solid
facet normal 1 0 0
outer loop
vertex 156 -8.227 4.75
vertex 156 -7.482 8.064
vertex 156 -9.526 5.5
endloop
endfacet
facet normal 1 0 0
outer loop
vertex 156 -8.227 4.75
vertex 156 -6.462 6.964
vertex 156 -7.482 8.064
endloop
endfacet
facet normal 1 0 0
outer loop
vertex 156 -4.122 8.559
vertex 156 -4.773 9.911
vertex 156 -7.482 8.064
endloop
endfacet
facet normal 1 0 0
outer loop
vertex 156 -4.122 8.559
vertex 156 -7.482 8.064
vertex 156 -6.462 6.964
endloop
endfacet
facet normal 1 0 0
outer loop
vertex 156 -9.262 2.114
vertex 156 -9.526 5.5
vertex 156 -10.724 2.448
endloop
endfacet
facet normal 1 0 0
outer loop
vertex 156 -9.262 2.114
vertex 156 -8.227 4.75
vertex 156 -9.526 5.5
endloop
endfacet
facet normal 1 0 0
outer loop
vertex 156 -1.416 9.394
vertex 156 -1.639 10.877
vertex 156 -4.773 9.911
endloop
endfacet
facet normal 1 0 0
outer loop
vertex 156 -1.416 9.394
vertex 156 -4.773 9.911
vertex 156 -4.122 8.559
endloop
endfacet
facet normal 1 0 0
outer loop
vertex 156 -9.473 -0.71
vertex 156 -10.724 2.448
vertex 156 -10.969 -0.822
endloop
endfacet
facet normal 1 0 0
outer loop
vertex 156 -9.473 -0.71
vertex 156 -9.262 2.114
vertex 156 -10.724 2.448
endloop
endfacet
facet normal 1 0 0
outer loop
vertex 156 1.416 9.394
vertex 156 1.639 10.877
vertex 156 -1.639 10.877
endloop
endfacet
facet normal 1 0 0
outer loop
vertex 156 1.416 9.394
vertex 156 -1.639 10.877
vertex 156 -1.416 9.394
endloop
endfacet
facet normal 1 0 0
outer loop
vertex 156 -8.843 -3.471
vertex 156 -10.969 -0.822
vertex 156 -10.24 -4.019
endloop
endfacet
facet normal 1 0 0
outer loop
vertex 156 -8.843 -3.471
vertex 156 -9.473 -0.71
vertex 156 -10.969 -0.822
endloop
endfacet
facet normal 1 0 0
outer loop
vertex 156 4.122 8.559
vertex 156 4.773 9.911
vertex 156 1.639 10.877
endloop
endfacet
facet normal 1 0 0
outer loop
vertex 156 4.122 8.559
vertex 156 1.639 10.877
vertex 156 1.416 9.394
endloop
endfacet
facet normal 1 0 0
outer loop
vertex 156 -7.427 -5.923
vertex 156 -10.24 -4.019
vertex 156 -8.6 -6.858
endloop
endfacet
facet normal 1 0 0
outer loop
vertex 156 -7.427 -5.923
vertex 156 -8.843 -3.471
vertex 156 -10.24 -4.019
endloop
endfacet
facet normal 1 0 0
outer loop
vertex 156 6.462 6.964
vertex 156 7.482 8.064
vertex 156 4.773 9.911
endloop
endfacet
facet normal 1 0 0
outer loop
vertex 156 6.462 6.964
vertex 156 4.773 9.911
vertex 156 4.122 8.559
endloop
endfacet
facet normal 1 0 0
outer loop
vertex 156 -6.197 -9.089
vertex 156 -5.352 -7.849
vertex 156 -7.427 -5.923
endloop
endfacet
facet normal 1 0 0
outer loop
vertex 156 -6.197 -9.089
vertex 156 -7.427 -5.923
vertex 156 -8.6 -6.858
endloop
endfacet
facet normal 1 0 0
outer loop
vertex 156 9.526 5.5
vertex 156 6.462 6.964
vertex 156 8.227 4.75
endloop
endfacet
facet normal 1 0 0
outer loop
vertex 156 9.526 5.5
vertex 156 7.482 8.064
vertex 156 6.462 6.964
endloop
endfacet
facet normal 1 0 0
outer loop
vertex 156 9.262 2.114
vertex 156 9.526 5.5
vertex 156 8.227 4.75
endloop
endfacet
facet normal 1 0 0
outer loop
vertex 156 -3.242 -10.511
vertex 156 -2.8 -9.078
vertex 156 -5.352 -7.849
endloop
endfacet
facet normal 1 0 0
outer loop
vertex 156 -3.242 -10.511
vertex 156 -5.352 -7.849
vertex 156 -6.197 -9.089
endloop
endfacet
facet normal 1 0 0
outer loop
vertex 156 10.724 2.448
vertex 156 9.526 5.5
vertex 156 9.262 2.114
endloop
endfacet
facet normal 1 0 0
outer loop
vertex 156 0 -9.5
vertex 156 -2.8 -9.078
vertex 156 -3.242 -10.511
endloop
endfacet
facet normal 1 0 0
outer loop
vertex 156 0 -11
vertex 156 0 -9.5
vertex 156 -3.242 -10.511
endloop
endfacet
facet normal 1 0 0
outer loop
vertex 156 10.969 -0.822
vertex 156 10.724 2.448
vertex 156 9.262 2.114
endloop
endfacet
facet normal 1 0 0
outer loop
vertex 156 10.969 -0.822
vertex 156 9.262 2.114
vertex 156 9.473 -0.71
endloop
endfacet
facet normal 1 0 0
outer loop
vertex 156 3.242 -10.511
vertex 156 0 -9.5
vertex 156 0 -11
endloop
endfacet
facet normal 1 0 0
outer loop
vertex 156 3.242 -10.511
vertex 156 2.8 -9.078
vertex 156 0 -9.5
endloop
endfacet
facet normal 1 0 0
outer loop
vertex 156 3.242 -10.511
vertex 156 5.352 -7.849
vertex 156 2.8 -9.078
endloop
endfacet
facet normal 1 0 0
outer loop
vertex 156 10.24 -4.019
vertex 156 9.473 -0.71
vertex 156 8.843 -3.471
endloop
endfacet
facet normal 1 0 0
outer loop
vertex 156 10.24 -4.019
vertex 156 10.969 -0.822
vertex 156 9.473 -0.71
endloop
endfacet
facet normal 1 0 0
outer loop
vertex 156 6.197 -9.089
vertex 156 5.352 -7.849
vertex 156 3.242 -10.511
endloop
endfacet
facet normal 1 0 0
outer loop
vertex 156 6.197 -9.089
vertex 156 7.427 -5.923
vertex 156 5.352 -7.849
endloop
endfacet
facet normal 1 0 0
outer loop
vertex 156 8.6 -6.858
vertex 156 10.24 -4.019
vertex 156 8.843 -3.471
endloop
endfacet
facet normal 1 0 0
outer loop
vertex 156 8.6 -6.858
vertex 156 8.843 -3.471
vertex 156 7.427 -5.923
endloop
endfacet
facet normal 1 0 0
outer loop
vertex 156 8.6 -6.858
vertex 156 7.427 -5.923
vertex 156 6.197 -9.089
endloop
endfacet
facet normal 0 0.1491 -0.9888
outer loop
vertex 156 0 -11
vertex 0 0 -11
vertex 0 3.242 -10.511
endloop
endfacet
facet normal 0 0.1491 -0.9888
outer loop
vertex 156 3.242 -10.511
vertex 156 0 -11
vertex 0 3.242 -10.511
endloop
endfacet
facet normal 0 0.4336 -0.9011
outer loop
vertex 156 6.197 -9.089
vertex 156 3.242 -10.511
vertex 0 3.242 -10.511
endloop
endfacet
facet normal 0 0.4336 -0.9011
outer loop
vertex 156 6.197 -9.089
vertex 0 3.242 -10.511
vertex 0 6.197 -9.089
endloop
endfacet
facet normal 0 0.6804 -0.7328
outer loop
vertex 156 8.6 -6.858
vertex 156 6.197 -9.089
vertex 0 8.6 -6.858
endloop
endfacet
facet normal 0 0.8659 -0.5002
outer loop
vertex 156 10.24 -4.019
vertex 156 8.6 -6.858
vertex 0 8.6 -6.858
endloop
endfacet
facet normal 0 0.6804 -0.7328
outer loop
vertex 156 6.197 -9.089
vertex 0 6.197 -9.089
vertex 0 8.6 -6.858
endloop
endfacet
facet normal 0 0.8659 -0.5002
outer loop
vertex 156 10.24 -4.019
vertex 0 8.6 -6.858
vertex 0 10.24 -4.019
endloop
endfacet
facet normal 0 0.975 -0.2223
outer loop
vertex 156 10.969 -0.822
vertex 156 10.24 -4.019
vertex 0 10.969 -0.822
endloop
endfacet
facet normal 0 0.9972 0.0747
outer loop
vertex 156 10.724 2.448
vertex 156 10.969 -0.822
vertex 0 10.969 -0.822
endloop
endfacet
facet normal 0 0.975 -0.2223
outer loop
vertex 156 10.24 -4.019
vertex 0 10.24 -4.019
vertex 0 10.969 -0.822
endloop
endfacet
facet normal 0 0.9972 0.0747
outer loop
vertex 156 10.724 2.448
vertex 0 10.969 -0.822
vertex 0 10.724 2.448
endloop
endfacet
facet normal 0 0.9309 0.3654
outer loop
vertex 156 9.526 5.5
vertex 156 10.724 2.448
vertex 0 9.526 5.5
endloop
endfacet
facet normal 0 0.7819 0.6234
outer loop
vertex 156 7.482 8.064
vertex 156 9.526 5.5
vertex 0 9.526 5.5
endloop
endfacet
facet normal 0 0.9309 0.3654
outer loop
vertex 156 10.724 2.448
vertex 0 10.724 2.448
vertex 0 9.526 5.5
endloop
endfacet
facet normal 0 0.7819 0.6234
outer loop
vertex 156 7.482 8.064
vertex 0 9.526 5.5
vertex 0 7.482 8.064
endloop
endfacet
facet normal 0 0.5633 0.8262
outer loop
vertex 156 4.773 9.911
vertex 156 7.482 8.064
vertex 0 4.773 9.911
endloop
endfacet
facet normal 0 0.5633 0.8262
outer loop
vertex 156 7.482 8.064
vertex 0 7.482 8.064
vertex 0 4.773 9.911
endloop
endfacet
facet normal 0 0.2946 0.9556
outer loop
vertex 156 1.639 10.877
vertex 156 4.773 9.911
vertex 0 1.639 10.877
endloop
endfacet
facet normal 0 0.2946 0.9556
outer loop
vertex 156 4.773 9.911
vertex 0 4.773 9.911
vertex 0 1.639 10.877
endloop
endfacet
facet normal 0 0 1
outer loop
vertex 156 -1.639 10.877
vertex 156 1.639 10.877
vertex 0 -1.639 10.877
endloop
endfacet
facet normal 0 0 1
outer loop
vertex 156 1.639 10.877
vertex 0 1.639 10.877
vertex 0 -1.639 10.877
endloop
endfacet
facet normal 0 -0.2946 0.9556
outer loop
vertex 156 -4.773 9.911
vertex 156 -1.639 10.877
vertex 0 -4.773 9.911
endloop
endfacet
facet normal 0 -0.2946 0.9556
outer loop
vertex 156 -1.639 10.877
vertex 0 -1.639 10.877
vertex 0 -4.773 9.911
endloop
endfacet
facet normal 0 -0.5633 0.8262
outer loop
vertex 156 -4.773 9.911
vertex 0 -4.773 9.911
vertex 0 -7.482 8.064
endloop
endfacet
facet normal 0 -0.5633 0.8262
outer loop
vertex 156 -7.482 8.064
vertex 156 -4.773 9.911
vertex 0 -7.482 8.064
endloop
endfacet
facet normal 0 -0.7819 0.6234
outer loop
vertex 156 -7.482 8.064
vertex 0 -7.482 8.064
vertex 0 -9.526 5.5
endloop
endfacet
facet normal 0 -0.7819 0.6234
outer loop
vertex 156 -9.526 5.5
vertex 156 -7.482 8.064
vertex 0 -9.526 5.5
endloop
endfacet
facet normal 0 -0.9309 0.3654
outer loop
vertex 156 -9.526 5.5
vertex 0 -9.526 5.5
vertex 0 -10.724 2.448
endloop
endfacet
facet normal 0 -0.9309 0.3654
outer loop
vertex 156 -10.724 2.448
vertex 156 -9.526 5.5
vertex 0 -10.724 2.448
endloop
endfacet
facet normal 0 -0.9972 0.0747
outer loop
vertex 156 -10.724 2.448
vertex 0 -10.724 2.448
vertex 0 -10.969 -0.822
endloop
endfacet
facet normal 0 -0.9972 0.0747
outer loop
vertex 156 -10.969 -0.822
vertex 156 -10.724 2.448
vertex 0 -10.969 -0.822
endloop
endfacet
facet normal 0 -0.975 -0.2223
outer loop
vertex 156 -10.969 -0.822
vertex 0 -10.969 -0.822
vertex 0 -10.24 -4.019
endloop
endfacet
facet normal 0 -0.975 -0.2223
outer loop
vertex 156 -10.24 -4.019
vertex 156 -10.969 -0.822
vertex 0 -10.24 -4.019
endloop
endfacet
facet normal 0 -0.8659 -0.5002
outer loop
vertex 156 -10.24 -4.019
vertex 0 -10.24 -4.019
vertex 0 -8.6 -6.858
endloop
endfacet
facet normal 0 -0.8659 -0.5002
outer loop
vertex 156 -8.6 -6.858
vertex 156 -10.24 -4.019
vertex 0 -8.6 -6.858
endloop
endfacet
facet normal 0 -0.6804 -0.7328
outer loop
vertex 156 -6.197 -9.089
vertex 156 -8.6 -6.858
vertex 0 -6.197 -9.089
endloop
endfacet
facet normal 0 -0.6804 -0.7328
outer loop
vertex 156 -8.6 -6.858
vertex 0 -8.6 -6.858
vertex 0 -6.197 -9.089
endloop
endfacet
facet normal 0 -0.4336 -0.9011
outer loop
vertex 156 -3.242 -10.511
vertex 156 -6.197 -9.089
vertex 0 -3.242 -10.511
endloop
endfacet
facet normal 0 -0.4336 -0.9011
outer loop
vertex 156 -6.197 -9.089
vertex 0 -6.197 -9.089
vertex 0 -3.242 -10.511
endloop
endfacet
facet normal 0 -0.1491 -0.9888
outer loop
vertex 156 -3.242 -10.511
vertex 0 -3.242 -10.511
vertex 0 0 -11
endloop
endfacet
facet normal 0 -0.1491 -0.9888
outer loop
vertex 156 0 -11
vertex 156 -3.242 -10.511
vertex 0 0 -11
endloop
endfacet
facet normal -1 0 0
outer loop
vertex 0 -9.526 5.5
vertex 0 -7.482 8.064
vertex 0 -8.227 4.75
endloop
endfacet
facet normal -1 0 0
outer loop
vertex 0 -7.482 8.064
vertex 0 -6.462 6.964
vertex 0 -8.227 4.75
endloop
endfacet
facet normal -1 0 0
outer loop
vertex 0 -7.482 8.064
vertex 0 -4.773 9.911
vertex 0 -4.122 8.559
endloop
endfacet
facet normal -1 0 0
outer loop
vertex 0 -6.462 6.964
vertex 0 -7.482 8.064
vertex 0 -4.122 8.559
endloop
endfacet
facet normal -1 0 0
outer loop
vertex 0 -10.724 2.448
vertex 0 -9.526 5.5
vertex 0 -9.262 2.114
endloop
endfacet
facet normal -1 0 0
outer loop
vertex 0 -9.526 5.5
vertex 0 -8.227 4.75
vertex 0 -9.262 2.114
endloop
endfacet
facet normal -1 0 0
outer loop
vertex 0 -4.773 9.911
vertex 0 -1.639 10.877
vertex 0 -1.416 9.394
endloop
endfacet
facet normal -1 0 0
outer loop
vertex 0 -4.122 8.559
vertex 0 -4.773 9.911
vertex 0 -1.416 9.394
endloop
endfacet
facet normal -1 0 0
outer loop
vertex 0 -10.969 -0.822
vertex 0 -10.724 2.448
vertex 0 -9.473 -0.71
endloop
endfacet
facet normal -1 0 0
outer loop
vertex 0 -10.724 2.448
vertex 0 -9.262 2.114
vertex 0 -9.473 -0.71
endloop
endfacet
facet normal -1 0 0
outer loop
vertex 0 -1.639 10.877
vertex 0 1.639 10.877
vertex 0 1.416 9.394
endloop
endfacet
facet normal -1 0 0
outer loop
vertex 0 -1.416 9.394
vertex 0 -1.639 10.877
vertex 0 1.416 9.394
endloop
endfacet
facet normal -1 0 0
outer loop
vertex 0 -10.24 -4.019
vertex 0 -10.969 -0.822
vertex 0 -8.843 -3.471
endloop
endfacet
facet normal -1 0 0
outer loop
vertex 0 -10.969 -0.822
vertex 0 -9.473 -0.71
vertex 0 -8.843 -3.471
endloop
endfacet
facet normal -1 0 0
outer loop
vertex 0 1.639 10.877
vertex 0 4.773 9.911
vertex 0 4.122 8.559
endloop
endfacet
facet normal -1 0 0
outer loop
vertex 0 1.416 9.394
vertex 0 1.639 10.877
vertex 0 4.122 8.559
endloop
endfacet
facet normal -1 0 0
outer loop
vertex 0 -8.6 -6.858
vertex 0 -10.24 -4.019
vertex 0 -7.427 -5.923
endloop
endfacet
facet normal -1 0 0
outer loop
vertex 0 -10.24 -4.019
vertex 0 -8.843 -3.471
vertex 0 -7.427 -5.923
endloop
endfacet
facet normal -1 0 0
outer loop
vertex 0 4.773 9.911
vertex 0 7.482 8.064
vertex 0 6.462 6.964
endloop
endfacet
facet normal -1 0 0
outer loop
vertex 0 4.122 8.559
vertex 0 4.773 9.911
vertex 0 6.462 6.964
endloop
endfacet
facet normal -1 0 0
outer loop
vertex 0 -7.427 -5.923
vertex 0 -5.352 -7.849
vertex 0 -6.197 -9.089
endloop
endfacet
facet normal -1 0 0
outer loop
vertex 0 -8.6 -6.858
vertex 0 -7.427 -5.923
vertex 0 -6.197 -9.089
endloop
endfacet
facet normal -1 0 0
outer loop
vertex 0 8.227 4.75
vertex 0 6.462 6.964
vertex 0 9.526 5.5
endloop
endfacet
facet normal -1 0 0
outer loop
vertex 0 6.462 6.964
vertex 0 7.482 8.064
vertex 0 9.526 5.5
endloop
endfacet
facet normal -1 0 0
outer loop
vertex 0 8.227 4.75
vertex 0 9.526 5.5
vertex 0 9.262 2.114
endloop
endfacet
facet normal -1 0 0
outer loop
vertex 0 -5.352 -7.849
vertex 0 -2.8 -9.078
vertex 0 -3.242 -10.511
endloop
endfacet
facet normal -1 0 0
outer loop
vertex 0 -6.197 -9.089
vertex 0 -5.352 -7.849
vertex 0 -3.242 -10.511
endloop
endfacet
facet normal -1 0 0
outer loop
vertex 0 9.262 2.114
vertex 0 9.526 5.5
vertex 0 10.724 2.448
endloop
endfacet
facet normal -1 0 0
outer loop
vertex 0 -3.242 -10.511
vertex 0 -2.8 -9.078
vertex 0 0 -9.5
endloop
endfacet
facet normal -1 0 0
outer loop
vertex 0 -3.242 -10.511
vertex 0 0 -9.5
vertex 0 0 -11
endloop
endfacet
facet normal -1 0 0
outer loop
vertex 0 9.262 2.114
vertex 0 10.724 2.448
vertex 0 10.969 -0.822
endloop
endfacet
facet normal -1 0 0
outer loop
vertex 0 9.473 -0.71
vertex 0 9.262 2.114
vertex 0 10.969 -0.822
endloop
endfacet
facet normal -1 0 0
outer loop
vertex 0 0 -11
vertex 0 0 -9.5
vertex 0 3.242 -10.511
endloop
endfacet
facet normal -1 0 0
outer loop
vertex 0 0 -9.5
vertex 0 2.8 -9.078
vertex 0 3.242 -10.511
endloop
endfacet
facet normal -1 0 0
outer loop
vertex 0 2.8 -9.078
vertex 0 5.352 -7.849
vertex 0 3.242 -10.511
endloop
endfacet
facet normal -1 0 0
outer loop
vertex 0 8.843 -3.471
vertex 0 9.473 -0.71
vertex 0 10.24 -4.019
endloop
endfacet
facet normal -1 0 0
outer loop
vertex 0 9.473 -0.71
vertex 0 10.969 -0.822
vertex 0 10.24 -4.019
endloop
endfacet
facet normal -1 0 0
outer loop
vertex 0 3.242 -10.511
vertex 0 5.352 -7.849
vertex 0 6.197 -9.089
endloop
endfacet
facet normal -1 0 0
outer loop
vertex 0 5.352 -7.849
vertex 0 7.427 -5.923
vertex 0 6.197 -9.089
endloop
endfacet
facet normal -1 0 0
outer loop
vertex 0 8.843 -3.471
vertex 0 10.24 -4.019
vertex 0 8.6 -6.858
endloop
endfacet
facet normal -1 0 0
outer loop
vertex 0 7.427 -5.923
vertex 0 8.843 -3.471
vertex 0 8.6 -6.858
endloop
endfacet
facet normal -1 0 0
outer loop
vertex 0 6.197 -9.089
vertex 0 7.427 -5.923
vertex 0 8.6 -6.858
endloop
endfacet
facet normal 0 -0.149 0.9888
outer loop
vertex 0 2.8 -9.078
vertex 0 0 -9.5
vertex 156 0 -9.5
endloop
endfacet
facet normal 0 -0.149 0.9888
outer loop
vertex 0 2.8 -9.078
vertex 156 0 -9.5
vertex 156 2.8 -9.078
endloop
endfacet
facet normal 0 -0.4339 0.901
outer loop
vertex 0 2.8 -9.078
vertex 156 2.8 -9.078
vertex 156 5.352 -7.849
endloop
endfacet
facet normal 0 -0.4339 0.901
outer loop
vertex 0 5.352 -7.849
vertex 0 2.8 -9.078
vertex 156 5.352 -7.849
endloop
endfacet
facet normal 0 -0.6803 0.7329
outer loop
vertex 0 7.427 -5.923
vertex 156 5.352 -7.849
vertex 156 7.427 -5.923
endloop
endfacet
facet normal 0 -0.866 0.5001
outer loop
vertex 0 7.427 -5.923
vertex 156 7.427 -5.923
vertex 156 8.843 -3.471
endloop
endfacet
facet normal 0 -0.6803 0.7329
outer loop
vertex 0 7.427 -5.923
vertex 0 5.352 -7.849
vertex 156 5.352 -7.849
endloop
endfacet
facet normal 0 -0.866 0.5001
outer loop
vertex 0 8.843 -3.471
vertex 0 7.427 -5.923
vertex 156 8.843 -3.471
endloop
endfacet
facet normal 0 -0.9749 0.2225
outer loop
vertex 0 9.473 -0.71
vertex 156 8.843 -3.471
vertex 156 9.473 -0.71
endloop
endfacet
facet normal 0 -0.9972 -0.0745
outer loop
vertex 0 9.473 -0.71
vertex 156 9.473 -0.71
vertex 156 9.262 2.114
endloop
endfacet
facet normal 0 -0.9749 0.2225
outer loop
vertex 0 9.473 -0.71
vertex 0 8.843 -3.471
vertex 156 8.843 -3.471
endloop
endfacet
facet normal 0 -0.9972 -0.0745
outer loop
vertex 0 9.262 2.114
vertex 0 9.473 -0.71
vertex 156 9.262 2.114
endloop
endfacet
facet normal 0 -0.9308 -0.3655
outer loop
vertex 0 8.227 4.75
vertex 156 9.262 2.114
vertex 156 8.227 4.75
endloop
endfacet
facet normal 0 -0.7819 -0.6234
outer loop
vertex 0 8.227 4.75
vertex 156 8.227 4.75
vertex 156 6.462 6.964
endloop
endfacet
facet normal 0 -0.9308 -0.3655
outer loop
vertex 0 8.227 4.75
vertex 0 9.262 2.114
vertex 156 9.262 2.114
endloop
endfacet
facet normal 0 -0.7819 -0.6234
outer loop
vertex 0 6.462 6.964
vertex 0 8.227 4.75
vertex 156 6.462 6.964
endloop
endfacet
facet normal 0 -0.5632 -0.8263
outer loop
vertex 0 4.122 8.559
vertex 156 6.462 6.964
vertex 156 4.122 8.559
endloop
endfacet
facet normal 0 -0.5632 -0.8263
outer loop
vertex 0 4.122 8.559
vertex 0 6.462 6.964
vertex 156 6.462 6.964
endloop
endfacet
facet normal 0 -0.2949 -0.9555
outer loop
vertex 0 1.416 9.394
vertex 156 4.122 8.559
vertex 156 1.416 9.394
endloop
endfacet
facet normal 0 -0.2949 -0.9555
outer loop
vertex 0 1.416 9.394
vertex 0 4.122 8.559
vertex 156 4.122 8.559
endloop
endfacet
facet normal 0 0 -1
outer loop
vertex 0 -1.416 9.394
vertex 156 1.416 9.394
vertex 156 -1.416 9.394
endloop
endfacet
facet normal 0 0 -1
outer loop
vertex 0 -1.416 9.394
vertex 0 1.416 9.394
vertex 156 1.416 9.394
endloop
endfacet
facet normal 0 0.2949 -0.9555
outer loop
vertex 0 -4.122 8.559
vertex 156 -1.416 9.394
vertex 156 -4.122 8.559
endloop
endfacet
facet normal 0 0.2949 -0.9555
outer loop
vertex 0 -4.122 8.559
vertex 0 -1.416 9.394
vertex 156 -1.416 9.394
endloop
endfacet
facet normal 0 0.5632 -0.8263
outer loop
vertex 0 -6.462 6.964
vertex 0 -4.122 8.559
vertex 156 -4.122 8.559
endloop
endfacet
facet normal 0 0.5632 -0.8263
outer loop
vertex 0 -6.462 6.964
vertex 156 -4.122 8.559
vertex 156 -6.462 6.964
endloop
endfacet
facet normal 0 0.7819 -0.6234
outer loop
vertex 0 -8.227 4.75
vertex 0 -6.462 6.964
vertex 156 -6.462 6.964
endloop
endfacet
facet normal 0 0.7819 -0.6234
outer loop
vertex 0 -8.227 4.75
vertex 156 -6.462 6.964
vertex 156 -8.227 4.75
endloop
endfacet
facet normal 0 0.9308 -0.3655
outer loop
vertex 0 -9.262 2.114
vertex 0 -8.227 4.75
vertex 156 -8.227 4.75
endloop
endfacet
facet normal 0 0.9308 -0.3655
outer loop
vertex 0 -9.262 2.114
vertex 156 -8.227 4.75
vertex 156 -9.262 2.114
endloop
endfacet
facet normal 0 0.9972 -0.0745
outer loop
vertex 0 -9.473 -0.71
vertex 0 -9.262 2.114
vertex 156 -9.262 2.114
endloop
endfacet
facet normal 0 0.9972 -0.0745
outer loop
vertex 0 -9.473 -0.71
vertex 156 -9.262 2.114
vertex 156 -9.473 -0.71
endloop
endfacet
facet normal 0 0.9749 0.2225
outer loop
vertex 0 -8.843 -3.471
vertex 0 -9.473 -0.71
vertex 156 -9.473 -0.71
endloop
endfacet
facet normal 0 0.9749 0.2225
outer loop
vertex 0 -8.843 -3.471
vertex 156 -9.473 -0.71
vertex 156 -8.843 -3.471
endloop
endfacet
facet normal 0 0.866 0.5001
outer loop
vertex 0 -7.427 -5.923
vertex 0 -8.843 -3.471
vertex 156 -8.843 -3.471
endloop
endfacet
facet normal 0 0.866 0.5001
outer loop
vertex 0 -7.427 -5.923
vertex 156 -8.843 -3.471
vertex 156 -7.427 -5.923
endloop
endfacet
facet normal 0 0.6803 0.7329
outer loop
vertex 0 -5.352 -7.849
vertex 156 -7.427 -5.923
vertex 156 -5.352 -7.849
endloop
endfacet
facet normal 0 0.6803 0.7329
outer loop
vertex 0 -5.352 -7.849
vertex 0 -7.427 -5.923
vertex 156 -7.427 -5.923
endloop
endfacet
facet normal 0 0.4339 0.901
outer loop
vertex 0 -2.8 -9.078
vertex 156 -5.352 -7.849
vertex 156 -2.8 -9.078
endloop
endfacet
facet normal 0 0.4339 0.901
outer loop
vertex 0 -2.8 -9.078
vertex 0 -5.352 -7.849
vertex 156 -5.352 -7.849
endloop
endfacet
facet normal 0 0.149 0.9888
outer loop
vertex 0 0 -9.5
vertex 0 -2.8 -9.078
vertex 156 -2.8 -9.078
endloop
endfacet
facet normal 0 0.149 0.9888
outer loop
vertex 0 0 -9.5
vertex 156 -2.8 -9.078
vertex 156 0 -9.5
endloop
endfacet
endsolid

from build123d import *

# Parameters (mm, degrees)
CYLINDER001_R     = 9.5
CYLINDER001_DEPTH = 156
CYLINDER_R        = 11
CYLINDER_DEPTH    = 156
CUT_PITCH_ANGLE   = 90


with BuildPart() as int:
    # Cylinder001 → Cylinder001 (new body)
    with BuildSketch(Plane.XY):
        Circle(CYLINDER001_R)
    extrude(amount=CYLINDER001_DEPTH)


with BuildPart() as steeltube:
    # Cylinder → Cylinder (new body)
    with BuildSketch(Plane.XY):
        Circle(CYLINDER_R)
    extrude(amount=CYLINDER_DEPTH)

    # Cut: cut INT
    add(int.part, mode=Mode.SUBTRACT)


with BuildPart() as steeltube_1:
    # Cut pitch: moved
    add(steeltube.part.rotate(Axis((0, 0, 0), (0, 1, 0)), CUT_PITCH_ANGLE))


with BuildPart() as steeltube_2:
    # Cut placement: moved
    add(steeltube_1.part)


solid = steeltube_2.part
